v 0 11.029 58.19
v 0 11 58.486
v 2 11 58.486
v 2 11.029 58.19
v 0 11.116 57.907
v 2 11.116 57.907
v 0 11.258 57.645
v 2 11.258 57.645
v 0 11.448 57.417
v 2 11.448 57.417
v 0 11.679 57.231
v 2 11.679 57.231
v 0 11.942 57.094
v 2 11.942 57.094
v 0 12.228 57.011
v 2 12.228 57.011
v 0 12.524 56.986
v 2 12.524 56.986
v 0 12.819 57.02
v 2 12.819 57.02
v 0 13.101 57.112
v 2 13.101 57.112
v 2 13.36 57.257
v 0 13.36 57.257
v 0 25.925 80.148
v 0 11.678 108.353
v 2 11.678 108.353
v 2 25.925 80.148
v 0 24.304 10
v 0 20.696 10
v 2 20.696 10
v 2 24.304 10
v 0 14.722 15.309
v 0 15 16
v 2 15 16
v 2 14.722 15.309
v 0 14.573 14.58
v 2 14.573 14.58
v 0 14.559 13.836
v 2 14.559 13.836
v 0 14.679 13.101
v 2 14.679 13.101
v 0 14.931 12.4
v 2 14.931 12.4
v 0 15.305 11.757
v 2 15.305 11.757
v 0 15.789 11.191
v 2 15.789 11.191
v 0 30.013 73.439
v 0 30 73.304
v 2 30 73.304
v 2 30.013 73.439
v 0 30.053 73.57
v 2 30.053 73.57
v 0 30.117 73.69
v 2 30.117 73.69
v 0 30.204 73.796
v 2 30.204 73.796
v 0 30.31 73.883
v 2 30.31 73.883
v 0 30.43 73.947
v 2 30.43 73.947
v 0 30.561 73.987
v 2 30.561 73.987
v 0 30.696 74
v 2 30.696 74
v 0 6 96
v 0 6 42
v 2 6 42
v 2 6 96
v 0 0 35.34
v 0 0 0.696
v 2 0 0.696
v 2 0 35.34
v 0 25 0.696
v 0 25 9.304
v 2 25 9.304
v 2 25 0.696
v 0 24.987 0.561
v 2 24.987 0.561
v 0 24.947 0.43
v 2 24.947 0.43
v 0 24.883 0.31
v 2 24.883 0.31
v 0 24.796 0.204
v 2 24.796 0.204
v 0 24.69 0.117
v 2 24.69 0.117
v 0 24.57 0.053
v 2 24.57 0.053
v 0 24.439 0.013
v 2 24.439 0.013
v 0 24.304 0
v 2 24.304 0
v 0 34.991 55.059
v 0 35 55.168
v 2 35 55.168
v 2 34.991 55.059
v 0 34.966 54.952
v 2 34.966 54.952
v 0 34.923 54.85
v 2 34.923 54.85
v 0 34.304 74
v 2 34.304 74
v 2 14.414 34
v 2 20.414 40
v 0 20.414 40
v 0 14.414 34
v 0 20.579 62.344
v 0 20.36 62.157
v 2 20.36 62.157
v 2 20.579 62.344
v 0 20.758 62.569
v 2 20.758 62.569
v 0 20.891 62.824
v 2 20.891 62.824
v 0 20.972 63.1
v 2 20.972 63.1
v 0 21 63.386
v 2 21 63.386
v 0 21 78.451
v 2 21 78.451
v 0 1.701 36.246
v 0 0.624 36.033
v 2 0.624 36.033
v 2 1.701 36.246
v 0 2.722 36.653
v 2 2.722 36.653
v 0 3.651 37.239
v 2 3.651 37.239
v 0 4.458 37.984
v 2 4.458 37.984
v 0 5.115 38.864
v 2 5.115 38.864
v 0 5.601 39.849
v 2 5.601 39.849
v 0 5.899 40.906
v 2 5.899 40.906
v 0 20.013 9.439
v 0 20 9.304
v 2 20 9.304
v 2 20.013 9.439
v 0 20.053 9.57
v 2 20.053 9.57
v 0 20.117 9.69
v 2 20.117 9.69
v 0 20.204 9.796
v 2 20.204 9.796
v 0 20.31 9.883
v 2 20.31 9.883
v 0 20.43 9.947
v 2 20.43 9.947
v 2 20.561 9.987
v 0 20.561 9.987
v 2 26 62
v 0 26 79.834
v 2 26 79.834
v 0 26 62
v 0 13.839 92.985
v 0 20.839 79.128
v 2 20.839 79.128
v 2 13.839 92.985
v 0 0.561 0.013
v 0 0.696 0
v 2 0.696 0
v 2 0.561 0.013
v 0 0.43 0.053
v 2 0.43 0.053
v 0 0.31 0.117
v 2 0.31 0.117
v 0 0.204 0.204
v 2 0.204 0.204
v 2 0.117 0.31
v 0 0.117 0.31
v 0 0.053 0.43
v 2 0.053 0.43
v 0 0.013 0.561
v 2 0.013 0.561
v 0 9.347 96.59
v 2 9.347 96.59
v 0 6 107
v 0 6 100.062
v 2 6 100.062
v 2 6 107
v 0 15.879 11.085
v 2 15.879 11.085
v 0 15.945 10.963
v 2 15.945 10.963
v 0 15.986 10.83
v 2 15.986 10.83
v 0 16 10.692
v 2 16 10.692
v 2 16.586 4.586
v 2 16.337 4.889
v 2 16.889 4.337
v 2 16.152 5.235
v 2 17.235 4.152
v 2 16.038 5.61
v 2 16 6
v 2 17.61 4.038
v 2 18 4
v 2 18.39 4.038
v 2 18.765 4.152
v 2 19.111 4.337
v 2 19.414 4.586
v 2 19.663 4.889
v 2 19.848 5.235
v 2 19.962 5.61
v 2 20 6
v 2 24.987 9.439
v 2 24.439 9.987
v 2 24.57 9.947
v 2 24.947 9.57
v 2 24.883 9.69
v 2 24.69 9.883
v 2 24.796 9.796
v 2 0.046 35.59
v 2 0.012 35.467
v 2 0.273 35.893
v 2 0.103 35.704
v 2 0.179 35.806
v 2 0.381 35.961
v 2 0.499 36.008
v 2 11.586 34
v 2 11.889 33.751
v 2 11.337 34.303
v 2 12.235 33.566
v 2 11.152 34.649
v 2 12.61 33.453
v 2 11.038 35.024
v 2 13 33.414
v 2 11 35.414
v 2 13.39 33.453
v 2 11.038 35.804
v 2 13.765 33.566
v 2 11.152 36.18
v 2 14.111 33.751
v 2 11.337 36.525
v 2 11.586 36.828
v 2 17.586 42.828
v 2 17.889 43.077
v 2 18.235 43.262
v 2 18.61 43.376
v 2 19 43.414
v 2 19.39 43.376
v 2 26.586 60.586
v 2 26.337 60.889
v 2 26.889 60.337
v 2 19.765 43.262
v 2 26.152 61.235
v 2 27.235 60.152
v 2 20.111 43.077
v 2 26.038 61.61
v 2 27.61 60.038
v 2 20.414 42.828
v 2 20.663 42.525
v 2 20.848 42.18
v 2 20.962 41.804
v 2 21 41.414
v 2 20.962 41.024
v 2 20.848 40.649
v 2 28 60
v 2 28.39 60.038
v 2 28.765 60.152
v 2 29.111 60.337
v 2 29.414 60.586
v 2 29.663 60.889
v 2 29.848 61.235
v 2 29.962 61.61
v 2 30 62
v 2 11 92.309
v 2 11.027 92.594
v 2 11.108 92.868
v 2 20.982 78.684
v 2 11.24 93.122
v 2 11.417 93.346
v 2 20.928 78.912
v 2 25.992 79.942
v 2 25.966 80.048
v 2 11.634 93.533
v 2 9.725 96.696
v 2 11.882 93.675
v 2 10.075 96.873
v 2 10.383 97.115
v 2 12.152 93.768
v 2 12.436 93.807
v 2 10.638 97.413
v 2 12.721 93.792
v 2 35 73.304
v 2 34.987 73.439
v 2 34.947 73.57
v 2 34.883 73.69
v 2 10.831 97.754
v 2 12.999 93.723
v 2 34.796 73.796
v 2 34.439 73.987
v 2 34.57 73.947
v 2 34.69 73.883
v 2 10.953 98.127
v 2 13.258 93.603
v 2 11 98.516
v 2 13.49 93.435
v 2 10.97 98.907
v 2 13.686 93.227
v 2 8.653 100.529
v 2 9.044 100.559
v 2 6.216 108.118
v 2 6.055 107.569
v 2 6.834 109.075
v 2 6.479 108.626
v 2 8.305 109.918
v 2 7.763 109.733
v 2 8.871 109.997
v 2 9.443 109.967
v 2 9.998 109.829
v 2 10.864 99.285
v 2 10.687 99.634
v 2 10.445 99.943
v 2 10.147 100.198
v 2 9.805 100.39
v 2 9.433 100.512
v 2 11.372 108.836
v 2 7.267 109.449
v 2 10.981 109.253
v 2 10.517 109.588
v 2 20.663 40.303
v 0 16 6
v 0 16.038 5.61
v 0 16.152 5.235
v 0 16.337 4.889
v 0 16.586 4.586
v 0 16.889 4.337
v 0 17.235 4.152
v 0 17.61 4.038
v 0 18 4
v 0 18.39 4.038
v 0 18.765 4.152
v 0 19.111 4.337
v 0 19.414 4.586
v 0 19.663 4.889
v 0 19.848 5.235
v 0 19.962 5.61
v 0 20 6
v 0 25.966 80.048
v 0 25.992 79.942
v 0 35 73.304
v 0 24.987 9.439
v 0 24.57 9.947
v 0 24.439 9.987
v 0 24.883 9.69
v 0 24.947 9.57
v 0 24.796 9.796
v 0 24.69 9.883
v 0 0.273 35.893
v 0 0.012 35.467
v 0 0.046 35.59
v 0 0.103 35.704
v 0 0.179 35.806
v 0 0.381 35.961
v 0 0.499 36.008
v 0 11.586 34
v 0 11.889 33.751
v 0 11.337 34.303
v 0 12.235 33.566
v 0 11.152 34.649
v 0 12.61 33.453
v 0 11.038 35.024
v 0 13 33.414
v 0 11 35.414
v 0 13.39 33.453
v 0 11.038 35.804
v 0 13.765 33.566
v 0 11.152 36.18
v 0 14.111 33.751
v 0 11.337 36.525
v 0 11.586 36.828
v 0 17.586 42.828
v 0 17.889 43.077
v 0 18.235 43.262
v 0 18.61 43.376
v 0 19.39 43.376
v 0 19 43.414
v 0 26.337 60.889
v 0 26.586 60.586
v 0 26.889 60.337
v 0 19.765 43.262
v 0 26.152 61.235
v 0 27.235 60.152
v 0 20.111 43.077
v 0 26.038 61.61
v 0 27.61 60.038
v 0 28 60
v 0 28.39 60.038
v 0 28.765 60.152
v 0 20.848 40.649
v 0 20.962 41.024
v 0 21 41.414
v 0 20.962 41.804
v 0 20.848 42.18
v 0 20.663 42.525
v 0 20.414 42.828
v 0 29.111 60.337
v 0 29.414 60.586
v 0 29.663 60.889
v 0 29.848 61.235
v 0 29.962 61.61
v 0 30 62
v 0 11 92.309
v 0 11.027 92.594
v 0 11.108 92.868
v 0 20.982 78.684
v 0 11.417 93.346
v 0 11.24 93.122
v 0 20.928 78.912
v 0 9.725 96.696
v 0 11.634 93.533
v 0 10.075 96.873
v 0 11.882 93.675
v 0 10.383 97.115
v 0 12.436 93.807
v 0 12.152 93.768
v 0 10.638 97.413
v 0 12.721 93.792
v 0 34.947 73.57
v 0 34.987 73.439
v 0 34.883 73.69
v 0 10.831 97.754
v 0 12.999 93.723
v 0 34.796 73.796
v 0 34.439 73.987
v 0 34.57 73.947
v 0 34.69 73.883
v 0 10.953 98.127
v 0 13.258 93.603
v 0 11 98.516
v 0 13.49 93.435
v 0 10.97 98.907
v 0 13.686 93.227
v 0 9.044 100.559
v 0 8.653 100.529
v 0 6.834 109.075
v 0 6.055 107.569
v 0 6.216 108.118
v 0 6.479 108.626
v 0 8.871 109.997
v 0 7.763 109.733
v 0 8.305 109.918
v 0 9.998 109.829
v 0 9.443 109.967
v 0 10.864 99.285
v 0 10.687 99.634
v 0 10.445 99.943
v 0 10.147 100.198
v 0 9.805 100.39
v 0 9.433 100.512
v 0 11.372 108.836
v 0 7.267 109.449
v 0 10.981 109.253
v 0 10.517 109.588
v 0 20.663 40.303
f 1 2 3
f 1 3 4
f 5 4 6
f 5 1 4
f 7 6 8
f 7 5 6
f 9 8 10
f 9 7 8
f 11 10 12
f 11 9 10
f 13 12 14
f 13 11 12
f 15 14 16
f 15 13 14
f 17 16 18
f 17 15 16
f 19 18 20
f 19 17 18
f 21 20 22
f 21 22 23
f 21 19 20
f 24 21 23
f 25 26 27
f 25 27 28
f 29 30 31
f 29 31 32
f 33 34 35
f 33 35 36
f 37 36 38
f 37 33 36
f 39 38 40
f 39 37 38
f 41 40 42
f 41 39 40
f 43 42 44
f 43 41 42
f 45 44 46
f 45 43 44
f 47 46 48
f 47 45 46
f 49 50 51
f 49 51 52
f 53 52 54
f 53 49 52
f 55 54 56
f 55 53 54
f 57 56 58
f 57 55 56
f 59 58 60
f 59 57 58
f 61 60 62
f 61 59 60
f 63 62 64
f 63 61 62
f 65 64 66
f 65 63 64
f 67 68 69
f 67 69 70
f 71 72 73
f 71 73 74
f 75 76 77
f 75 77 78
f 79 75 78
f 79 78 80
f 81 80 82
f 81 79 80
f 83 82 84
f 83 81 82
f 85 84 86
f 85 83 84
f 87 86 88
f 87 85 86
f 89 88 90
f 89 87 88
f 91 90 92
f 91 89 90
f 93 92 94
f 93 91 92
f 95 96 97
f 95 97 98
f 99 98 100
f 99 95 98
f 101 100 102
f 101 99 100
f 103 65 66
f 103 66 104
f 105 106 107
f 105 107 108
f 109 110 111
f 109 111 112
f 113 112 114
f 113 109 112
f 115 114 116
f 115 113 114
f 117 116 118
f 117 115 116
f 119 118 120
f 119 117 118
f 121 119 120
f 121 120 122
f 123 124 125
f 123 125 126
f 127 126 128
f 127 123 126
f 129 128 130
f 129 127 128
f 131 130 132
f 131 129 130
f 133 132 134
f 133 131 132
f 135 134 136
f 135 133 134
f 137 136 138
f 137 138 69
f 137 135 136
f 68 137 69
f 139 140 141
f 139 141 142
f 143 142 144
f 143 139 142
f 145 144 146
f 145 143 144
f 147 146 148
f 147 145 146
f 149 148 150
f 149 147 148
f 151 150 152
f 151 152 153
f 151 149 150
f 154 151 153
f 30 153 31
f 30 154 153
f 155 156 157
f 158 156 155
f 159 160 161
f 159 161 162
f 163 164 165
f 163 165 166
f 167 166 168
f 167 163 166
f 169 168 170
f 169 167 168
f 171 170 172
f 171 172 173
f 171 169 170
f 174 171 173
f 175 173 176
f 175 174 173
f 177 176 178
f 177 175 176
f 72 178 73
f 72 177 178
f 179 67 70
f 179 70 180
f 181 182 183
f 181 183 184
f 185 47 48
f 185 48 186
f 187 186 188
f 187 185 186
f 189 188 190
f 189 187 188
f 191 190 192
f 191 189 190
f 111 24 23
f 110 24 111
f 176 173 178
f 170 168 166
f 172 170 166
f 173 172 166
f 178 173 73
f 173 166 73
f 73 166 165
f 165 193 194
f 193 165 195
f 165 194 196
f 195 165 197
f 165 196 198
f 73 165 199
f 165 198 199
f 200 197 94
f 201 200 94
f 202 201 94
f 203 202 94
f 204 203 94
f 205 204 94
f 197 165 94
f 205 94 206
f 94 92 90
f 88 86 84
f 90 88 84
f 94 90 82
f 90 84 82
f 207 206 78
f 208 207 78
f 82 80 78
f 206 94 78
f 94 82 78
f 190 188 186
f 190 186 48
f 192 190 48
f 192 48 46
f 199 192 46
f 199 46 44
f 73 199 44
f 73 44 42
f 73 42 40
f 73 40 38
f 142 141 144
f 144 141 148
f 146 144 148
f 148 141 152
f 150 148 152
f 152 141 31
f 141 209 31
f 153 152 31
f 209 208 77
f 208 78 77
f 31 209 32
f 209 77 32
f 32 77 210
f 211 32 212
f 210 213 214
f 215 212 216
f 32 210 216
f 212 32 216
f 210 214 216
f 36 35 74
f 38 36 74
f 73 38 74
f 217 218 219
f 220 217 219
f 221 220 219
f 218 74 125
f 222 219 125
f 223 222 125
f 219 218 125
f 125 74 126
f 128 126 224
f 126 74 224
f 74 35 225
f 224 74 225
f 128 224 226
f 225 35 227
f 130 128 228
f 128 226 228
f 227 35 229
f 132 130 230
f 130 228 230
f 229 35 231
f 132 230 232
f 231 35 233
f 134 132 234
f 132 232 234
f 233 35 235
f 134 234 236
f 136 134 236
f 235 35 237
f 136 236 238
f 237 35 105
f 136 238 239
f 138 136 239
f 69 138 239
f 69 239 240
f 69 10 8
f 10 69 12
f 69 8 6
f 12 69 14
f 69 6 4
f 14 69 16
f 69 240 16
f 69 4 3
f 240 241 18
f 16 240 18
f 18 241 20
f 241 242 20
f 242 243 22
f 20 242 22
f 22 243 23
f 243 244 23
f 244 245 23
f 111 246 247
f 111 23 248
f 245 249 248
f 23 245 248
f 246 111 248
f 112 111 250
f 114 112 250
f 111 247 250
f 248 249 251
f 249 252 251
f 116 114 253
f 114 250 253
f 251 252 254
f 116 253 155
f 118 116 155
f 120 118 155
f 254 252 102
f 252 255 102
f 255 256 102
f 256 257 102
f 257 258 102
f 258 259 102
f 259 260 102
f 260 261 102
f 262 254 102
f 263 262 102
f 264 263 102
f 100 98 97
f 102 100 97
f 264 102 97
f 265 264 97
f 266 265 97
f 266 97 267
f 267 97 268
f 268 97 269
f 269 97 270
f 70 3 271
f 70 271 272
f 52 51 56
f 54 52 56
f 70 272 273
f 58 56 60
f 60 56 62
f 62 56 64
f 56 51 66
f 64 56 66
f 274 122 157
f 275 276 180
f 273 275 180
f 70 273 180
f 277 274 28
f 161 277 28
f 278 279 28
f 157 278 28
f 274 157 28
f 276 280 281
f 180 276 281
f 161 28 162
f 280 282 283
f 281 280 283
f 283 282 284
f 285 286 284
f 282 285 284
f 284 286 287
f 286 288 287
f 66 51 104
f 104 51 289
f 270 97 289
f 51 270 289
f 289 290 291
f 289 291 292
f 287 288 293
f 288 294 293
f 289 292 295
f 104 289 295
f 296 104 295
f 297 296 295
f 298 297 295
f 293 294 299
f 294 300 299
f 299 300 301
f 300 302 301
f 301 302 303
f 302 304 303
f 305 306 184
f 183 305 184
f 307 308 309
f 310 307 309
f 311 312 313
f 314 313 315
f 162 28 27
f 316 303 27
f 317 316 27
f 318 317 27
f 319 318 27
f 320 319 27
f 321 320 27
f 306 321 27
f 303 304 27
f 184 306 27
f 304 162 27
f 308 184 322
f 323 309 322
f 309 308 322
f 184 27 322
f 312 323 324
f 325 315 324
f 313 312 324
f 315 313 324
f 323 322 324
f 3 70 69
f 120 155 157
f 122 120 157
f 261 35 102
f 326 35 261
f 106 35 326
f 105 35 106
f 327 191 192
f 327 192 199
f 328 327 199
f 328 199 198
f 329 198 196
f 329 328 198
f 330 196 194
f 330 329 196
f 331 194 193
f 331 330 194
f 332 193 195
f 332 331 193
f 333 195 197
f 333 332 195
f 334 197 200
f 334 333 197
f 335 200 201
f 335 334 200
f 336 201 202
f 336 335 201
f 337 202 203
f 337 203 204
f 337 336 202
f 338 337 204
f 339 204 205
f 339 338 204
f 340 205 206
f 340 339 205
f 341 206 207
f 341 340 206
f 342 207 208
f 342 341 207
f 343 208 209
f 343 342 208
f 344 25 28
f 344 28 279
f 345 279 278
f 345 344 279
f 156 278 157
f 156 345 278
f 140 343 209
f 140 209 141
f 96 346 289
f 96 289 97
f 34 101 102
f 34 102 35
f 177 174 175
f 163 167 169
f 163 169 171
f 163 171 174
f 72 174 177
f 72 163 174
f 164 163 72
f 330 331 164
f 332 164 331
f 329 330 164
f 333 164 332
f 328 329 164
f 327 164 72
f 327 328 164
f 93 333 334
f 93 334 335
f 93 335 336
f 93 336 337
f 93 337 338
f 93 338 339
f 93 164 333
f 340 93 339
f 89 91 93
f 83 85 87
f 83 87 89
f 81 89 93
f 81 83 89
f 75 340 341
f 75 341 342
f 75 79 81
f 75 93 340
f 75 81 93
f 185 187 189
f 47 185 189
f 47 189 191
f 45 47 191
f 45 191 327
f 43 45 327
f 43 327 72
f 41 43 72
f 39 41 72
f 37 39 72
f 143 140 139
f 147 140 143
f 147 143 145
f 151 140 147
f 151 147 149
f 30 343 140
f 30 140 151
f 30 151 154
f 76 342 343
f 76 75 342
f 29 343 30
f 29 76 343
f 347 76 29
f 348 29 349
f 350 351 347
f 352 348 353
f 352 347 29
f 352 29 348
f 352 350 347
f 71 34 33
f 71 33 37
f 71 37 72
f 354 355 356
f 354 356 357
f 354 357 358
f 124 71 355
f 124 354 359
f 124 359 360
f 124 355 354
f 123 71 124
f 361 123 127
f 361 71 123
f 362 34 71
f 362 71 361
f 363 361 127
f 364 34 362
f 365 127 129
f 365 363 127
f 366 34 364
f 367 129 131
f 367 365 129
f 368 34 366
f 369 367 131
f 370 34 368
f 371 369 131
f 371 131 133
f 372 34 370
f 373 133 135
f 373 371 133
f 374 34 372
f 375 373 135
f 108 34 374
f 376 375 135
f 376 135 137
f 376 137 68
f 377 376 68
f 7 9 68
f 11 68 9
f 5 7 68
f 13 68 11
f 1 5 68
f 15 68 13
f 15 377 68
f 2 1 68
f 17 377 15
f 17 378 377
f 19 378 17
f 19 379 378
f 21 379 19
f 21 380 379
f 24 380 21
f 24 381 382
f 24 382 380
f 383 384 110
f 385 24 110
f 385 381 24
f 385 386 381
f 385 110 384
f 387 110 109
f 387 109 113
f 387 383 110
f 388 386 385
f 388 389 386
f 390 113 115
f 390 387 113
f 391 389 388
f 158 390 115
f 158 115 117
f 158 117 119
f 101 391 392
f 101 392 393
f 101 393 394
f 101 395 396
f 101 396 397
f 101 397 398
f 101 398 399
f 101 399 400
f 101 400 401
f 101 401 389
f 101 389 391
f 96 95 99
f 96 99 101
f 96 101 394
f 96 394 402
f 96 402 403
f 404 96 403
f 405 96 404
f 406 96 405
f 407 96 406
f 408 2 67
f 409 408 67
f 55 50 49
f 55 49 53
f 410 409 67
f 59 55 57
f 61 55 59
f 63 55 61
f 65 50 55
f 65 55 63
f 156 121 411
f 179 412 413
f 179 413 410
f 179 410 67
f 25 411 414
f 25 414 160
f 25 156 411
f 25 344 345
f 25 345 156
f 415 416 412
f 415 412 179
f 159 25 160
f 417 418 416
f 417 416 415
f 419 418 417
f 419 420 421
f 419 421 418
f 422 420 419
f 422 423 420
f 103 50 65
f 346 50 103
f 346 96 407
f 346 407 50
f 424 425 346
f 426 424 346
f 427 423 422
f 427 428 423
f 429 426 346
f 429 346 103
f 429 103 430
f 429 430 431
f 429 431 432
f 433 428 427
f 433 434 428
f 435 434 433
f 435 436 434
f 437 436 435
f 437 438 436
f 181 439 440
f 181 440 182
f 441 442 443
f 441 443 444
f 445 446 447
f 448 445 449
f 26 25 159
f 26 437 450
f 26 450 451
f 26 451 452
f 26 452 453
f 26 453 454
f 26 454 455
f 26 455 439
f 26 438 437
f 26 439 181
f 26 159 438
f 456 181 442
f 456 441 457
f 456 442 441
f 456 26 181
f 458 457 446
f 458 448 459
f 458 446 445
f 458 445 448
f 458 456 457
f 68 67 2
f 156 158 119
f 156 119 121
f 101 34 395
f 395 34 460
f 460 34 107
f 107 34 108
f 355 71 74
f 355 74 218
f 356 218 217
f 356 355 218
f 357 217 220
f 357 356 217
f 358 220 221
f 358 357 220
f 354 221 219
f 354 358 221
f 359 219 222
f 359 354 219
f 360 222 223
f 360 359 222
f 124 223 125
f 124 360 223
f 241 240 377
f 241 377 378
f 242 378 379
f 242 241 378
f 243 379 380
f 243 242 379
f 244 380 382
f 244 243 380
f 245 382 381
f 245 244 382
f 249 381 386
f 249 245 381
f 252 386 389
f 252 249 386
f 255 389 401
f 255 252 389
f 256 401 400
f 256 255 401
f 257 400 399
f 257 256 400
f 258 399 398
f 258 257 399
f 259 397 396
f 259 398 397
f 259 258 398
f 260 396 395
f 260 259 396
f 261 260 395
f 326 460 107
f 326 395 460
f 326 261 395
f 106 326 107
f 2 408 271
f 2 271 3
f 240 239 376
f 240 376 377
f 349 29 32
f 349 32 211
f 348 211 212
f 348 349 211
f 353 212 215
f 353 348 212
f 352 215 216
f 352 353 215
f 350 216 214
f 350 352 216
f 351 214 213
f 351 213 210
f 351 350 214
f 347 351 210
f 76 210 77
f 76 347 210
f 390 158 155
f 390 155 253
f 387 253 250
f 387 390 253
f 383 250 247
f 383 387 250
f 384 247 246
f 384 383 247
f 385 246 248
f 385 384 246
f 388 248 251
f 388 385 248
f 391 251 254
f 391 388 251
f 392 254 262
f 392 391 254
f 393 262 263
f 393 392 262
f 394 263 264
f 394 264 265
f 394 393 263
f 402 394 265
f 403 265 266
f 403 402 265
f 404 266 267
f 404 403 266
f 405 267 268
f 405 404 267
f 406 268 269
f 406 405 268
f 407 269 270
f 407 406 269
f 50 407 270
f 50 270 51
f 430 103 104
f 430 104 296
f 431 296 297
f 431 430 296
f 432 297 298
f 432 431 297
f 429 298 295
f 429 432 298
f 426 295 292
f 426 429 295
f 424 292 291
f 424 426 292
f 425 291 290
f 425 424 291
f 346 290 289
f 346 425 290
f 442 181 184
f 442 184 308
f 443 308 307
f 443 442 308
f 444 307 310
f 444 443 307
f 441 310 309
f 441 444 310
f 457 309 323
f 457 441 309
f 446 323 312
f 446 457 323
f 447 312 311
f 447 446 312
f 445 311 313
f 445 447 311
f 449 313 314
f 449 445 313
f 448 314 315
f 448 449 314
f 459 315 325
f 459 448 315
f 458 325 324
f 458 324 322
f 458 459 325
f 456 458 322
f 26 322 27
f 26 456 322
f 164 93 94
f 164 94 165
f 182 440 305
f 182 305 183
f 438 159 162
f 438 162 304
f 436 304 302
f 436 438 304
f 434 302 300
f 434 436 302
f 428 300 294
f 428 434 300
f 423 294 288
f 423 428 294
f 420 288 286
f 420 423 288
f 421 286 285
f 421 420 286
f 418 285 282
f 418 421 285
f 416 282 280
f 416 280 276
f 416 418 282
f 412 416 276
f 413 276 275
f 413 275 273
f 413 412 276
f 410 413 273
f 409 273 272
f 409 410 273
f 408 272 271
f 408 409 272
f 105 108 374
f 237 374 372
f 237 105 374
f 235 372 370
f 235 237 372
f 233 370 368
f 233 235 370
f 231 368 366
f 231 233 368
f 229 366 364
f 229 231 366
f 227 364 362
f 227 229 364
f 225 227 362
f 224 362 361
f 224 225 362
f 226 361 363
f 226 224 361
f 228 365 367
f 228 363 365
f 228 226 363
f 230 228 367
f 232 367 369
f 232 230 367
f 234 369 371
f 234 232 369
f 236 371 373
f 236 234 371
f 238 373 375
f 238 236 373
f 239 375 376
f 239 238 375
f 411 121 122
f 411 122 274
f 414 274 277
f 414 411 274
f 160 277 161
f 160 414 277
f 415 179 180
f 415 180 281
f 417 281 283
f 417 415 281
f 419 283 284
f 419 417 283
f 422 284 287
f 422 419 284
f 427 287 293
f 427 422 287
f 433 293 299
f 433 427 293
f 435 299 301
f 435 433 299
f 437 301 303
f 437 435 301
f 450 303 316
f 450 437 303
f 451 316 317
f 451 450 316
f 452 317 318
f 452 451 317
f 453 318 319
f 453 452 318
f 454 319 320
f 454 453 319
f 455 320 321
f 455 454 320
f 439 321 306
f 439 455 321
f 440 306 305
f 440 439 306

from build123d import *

# Parameters (mm, degrees)
RESSALTO_EXTRUS_O1_DEPTH = 2
CORTE_EXTRUS_O1_DEPTH    = 116.451288429


with BuildPart() as part:
    # Esboço1 → Ressalto-extrusão1 (new body)
    with BuildSketch(Plane(origin=(0, 0, 0), x_dir=(0, 0, -1), z_dir=(1, 0, 0))):
        with BuildLine():
            Line((0, 24.303568951), (0, 0.696431049))
            ThreePointArc((0, 0.696431049), (-0.203979932, 0.203979932), (-0.696431049, 0))
            Line((-0.696431049, 0), (-35.339881939, 0))
            ThreePointArc((-35.339881939, 0), (-35.806022669, 0.179005667), (-36.032536425, 0.624001989))
            ThreePointArc((-36.032536425, 0.624001989), (-37.984032615, 4.457802818), (-42, 6))
            Line((-42, 6), (-96, 6))
            Line((-96, 6), (-96.59021866, 9.347296355))
            ThreePointArc((-96.59021866, 9.347296355), (-98.907130521, 10.969615506), (-100.529449672, 8.652703645))
            Line((-100.529449672, 8.652703645), (-100.061706448, 6))
            Line((-100.061706448, 6), (-107, 6))
            ThreePointArc((-107, 6), (-109.918324731, 8.304744102), (-108.352654988, 11.677746157))
            Line((-108.352654988, 11.677746157), (-80.148093958, 25.925190806))
            ThreePointArc((-80.148093958, 25.925190806), (-79.995482912, 25.981039602), (-79.834083648, 26))
            Line((-79.834083648, 26), (-62, 26))
            ThreePointArc((-62, 26), (-60, 28), (-62, 30))
            Line((-62, 30), (-73.303568951, 30))
            ThreePointArc((-73.303568951, 30), (-73.796020068, 30.203979932), (-74, 30.696431049))
            Line((-74, 30.696431049), (-74, 34.303568951))
            ThreePointArc((-74, 34.303568951), (-73.796020068, 34.796020068), (-73.303568951, 35))
            Line((-73.303568951, 35), (-55.168160729, 35))
            ThreePointArc((-55.168160729, 35), (-55.004697711, 34.980544614), (-54.850367647, 34.92326546))
            Line((-54.850367647, 34.92326546), (-16, 15))
            ThreePointArc((-16, 15), (-13.465644125, 14.602459282), (-11.191291491, 15.789185206))
            ThreePointArc((-11.191291491, 15.789185206), (-10.963040008, 15.945135177), (-10.692099084, 16))
            Line((-10.692099084, 16), (-6, 16))
            ThreePointArc((-6, 16), (-4, 18), (-6, 20))
            Line((-6, 20), (-9.303568951, 20))
            ThreePointArc((-9.303568951, 20), (-9.796020068, 20.203979932), (-10, 20.696431049))
            Line((-10, 20.696431049), (-10, 24.303568951))
            ThreePointArc((-10, 24.303568951), (-9.796020068, 24.796020068), (-9.303568951, 25))
            Line((-9.303568951, 25), (-0.696431049, 25))
            ThreePointArc((-0.696431049, 25), (-0.203979932, 24.796020068), (0, 24.303568951))
        make_face()
        with BuildLine():
            Line((-92.308809913, 11), (-58.486017578, 11))
            ThreePointArc((-58.486017578, 11), (-57.155549564, 11.807284429), (-57.257169698, 13.360193517))
            Line((-57.257169698, 13.360193517), (-62.157169698, 20.360193517))
            ThreePointArc((-62.157169698, 20.360193517), (-62.693302007, 20.830468014), (-63.386017578, 21))
            Line((-63.386017578, 21), (-78.451452887, 21))
            ThreePointArc((-78.451452887, 21), (-78.799080836, 20.959162366), (-79.127780381, 20.838873079))
            Line((-79.127780381, 20.838873079), (-92.985137407, 13.838873079))
            ThreePointArc((-92.985137407, 13.838873079), (-93.767972278, 12.152372051), (-92.308809913, 11))
        make_face(mode=Mode.SUBTRACT)
    extrude(amount=RESSALTO_EXTRUS_O1_DEPTH)

    # Esboço2 → Corte-extrusão1 (cut, through all)
    with BuildSketch(Plane(origin=(2, 0, 0), x_dir=(0, 0, -1), z_dir=(1, 0, 0))):
        with BuildLine():
            Line((-40, 20.414213562), (-34, 14.414213562))
            ThreePointArc((-34, 14.414213562), (-34, 11.585786438), (-36.828427125, 11.585786438))
            Line((-36.828427125, 11.585786438), (-42.828427125, 17.585786438))
            ThreePointArc((-42.828427125, 17.585786438), (-42.828427125, 20.414213562), (-40, 20.414213562))
        make_face()
    extrude(amount=-CORTE_EXTRUS_O1_DEPTH, mode=Mode.SUBTRACT)


solid = part.part
